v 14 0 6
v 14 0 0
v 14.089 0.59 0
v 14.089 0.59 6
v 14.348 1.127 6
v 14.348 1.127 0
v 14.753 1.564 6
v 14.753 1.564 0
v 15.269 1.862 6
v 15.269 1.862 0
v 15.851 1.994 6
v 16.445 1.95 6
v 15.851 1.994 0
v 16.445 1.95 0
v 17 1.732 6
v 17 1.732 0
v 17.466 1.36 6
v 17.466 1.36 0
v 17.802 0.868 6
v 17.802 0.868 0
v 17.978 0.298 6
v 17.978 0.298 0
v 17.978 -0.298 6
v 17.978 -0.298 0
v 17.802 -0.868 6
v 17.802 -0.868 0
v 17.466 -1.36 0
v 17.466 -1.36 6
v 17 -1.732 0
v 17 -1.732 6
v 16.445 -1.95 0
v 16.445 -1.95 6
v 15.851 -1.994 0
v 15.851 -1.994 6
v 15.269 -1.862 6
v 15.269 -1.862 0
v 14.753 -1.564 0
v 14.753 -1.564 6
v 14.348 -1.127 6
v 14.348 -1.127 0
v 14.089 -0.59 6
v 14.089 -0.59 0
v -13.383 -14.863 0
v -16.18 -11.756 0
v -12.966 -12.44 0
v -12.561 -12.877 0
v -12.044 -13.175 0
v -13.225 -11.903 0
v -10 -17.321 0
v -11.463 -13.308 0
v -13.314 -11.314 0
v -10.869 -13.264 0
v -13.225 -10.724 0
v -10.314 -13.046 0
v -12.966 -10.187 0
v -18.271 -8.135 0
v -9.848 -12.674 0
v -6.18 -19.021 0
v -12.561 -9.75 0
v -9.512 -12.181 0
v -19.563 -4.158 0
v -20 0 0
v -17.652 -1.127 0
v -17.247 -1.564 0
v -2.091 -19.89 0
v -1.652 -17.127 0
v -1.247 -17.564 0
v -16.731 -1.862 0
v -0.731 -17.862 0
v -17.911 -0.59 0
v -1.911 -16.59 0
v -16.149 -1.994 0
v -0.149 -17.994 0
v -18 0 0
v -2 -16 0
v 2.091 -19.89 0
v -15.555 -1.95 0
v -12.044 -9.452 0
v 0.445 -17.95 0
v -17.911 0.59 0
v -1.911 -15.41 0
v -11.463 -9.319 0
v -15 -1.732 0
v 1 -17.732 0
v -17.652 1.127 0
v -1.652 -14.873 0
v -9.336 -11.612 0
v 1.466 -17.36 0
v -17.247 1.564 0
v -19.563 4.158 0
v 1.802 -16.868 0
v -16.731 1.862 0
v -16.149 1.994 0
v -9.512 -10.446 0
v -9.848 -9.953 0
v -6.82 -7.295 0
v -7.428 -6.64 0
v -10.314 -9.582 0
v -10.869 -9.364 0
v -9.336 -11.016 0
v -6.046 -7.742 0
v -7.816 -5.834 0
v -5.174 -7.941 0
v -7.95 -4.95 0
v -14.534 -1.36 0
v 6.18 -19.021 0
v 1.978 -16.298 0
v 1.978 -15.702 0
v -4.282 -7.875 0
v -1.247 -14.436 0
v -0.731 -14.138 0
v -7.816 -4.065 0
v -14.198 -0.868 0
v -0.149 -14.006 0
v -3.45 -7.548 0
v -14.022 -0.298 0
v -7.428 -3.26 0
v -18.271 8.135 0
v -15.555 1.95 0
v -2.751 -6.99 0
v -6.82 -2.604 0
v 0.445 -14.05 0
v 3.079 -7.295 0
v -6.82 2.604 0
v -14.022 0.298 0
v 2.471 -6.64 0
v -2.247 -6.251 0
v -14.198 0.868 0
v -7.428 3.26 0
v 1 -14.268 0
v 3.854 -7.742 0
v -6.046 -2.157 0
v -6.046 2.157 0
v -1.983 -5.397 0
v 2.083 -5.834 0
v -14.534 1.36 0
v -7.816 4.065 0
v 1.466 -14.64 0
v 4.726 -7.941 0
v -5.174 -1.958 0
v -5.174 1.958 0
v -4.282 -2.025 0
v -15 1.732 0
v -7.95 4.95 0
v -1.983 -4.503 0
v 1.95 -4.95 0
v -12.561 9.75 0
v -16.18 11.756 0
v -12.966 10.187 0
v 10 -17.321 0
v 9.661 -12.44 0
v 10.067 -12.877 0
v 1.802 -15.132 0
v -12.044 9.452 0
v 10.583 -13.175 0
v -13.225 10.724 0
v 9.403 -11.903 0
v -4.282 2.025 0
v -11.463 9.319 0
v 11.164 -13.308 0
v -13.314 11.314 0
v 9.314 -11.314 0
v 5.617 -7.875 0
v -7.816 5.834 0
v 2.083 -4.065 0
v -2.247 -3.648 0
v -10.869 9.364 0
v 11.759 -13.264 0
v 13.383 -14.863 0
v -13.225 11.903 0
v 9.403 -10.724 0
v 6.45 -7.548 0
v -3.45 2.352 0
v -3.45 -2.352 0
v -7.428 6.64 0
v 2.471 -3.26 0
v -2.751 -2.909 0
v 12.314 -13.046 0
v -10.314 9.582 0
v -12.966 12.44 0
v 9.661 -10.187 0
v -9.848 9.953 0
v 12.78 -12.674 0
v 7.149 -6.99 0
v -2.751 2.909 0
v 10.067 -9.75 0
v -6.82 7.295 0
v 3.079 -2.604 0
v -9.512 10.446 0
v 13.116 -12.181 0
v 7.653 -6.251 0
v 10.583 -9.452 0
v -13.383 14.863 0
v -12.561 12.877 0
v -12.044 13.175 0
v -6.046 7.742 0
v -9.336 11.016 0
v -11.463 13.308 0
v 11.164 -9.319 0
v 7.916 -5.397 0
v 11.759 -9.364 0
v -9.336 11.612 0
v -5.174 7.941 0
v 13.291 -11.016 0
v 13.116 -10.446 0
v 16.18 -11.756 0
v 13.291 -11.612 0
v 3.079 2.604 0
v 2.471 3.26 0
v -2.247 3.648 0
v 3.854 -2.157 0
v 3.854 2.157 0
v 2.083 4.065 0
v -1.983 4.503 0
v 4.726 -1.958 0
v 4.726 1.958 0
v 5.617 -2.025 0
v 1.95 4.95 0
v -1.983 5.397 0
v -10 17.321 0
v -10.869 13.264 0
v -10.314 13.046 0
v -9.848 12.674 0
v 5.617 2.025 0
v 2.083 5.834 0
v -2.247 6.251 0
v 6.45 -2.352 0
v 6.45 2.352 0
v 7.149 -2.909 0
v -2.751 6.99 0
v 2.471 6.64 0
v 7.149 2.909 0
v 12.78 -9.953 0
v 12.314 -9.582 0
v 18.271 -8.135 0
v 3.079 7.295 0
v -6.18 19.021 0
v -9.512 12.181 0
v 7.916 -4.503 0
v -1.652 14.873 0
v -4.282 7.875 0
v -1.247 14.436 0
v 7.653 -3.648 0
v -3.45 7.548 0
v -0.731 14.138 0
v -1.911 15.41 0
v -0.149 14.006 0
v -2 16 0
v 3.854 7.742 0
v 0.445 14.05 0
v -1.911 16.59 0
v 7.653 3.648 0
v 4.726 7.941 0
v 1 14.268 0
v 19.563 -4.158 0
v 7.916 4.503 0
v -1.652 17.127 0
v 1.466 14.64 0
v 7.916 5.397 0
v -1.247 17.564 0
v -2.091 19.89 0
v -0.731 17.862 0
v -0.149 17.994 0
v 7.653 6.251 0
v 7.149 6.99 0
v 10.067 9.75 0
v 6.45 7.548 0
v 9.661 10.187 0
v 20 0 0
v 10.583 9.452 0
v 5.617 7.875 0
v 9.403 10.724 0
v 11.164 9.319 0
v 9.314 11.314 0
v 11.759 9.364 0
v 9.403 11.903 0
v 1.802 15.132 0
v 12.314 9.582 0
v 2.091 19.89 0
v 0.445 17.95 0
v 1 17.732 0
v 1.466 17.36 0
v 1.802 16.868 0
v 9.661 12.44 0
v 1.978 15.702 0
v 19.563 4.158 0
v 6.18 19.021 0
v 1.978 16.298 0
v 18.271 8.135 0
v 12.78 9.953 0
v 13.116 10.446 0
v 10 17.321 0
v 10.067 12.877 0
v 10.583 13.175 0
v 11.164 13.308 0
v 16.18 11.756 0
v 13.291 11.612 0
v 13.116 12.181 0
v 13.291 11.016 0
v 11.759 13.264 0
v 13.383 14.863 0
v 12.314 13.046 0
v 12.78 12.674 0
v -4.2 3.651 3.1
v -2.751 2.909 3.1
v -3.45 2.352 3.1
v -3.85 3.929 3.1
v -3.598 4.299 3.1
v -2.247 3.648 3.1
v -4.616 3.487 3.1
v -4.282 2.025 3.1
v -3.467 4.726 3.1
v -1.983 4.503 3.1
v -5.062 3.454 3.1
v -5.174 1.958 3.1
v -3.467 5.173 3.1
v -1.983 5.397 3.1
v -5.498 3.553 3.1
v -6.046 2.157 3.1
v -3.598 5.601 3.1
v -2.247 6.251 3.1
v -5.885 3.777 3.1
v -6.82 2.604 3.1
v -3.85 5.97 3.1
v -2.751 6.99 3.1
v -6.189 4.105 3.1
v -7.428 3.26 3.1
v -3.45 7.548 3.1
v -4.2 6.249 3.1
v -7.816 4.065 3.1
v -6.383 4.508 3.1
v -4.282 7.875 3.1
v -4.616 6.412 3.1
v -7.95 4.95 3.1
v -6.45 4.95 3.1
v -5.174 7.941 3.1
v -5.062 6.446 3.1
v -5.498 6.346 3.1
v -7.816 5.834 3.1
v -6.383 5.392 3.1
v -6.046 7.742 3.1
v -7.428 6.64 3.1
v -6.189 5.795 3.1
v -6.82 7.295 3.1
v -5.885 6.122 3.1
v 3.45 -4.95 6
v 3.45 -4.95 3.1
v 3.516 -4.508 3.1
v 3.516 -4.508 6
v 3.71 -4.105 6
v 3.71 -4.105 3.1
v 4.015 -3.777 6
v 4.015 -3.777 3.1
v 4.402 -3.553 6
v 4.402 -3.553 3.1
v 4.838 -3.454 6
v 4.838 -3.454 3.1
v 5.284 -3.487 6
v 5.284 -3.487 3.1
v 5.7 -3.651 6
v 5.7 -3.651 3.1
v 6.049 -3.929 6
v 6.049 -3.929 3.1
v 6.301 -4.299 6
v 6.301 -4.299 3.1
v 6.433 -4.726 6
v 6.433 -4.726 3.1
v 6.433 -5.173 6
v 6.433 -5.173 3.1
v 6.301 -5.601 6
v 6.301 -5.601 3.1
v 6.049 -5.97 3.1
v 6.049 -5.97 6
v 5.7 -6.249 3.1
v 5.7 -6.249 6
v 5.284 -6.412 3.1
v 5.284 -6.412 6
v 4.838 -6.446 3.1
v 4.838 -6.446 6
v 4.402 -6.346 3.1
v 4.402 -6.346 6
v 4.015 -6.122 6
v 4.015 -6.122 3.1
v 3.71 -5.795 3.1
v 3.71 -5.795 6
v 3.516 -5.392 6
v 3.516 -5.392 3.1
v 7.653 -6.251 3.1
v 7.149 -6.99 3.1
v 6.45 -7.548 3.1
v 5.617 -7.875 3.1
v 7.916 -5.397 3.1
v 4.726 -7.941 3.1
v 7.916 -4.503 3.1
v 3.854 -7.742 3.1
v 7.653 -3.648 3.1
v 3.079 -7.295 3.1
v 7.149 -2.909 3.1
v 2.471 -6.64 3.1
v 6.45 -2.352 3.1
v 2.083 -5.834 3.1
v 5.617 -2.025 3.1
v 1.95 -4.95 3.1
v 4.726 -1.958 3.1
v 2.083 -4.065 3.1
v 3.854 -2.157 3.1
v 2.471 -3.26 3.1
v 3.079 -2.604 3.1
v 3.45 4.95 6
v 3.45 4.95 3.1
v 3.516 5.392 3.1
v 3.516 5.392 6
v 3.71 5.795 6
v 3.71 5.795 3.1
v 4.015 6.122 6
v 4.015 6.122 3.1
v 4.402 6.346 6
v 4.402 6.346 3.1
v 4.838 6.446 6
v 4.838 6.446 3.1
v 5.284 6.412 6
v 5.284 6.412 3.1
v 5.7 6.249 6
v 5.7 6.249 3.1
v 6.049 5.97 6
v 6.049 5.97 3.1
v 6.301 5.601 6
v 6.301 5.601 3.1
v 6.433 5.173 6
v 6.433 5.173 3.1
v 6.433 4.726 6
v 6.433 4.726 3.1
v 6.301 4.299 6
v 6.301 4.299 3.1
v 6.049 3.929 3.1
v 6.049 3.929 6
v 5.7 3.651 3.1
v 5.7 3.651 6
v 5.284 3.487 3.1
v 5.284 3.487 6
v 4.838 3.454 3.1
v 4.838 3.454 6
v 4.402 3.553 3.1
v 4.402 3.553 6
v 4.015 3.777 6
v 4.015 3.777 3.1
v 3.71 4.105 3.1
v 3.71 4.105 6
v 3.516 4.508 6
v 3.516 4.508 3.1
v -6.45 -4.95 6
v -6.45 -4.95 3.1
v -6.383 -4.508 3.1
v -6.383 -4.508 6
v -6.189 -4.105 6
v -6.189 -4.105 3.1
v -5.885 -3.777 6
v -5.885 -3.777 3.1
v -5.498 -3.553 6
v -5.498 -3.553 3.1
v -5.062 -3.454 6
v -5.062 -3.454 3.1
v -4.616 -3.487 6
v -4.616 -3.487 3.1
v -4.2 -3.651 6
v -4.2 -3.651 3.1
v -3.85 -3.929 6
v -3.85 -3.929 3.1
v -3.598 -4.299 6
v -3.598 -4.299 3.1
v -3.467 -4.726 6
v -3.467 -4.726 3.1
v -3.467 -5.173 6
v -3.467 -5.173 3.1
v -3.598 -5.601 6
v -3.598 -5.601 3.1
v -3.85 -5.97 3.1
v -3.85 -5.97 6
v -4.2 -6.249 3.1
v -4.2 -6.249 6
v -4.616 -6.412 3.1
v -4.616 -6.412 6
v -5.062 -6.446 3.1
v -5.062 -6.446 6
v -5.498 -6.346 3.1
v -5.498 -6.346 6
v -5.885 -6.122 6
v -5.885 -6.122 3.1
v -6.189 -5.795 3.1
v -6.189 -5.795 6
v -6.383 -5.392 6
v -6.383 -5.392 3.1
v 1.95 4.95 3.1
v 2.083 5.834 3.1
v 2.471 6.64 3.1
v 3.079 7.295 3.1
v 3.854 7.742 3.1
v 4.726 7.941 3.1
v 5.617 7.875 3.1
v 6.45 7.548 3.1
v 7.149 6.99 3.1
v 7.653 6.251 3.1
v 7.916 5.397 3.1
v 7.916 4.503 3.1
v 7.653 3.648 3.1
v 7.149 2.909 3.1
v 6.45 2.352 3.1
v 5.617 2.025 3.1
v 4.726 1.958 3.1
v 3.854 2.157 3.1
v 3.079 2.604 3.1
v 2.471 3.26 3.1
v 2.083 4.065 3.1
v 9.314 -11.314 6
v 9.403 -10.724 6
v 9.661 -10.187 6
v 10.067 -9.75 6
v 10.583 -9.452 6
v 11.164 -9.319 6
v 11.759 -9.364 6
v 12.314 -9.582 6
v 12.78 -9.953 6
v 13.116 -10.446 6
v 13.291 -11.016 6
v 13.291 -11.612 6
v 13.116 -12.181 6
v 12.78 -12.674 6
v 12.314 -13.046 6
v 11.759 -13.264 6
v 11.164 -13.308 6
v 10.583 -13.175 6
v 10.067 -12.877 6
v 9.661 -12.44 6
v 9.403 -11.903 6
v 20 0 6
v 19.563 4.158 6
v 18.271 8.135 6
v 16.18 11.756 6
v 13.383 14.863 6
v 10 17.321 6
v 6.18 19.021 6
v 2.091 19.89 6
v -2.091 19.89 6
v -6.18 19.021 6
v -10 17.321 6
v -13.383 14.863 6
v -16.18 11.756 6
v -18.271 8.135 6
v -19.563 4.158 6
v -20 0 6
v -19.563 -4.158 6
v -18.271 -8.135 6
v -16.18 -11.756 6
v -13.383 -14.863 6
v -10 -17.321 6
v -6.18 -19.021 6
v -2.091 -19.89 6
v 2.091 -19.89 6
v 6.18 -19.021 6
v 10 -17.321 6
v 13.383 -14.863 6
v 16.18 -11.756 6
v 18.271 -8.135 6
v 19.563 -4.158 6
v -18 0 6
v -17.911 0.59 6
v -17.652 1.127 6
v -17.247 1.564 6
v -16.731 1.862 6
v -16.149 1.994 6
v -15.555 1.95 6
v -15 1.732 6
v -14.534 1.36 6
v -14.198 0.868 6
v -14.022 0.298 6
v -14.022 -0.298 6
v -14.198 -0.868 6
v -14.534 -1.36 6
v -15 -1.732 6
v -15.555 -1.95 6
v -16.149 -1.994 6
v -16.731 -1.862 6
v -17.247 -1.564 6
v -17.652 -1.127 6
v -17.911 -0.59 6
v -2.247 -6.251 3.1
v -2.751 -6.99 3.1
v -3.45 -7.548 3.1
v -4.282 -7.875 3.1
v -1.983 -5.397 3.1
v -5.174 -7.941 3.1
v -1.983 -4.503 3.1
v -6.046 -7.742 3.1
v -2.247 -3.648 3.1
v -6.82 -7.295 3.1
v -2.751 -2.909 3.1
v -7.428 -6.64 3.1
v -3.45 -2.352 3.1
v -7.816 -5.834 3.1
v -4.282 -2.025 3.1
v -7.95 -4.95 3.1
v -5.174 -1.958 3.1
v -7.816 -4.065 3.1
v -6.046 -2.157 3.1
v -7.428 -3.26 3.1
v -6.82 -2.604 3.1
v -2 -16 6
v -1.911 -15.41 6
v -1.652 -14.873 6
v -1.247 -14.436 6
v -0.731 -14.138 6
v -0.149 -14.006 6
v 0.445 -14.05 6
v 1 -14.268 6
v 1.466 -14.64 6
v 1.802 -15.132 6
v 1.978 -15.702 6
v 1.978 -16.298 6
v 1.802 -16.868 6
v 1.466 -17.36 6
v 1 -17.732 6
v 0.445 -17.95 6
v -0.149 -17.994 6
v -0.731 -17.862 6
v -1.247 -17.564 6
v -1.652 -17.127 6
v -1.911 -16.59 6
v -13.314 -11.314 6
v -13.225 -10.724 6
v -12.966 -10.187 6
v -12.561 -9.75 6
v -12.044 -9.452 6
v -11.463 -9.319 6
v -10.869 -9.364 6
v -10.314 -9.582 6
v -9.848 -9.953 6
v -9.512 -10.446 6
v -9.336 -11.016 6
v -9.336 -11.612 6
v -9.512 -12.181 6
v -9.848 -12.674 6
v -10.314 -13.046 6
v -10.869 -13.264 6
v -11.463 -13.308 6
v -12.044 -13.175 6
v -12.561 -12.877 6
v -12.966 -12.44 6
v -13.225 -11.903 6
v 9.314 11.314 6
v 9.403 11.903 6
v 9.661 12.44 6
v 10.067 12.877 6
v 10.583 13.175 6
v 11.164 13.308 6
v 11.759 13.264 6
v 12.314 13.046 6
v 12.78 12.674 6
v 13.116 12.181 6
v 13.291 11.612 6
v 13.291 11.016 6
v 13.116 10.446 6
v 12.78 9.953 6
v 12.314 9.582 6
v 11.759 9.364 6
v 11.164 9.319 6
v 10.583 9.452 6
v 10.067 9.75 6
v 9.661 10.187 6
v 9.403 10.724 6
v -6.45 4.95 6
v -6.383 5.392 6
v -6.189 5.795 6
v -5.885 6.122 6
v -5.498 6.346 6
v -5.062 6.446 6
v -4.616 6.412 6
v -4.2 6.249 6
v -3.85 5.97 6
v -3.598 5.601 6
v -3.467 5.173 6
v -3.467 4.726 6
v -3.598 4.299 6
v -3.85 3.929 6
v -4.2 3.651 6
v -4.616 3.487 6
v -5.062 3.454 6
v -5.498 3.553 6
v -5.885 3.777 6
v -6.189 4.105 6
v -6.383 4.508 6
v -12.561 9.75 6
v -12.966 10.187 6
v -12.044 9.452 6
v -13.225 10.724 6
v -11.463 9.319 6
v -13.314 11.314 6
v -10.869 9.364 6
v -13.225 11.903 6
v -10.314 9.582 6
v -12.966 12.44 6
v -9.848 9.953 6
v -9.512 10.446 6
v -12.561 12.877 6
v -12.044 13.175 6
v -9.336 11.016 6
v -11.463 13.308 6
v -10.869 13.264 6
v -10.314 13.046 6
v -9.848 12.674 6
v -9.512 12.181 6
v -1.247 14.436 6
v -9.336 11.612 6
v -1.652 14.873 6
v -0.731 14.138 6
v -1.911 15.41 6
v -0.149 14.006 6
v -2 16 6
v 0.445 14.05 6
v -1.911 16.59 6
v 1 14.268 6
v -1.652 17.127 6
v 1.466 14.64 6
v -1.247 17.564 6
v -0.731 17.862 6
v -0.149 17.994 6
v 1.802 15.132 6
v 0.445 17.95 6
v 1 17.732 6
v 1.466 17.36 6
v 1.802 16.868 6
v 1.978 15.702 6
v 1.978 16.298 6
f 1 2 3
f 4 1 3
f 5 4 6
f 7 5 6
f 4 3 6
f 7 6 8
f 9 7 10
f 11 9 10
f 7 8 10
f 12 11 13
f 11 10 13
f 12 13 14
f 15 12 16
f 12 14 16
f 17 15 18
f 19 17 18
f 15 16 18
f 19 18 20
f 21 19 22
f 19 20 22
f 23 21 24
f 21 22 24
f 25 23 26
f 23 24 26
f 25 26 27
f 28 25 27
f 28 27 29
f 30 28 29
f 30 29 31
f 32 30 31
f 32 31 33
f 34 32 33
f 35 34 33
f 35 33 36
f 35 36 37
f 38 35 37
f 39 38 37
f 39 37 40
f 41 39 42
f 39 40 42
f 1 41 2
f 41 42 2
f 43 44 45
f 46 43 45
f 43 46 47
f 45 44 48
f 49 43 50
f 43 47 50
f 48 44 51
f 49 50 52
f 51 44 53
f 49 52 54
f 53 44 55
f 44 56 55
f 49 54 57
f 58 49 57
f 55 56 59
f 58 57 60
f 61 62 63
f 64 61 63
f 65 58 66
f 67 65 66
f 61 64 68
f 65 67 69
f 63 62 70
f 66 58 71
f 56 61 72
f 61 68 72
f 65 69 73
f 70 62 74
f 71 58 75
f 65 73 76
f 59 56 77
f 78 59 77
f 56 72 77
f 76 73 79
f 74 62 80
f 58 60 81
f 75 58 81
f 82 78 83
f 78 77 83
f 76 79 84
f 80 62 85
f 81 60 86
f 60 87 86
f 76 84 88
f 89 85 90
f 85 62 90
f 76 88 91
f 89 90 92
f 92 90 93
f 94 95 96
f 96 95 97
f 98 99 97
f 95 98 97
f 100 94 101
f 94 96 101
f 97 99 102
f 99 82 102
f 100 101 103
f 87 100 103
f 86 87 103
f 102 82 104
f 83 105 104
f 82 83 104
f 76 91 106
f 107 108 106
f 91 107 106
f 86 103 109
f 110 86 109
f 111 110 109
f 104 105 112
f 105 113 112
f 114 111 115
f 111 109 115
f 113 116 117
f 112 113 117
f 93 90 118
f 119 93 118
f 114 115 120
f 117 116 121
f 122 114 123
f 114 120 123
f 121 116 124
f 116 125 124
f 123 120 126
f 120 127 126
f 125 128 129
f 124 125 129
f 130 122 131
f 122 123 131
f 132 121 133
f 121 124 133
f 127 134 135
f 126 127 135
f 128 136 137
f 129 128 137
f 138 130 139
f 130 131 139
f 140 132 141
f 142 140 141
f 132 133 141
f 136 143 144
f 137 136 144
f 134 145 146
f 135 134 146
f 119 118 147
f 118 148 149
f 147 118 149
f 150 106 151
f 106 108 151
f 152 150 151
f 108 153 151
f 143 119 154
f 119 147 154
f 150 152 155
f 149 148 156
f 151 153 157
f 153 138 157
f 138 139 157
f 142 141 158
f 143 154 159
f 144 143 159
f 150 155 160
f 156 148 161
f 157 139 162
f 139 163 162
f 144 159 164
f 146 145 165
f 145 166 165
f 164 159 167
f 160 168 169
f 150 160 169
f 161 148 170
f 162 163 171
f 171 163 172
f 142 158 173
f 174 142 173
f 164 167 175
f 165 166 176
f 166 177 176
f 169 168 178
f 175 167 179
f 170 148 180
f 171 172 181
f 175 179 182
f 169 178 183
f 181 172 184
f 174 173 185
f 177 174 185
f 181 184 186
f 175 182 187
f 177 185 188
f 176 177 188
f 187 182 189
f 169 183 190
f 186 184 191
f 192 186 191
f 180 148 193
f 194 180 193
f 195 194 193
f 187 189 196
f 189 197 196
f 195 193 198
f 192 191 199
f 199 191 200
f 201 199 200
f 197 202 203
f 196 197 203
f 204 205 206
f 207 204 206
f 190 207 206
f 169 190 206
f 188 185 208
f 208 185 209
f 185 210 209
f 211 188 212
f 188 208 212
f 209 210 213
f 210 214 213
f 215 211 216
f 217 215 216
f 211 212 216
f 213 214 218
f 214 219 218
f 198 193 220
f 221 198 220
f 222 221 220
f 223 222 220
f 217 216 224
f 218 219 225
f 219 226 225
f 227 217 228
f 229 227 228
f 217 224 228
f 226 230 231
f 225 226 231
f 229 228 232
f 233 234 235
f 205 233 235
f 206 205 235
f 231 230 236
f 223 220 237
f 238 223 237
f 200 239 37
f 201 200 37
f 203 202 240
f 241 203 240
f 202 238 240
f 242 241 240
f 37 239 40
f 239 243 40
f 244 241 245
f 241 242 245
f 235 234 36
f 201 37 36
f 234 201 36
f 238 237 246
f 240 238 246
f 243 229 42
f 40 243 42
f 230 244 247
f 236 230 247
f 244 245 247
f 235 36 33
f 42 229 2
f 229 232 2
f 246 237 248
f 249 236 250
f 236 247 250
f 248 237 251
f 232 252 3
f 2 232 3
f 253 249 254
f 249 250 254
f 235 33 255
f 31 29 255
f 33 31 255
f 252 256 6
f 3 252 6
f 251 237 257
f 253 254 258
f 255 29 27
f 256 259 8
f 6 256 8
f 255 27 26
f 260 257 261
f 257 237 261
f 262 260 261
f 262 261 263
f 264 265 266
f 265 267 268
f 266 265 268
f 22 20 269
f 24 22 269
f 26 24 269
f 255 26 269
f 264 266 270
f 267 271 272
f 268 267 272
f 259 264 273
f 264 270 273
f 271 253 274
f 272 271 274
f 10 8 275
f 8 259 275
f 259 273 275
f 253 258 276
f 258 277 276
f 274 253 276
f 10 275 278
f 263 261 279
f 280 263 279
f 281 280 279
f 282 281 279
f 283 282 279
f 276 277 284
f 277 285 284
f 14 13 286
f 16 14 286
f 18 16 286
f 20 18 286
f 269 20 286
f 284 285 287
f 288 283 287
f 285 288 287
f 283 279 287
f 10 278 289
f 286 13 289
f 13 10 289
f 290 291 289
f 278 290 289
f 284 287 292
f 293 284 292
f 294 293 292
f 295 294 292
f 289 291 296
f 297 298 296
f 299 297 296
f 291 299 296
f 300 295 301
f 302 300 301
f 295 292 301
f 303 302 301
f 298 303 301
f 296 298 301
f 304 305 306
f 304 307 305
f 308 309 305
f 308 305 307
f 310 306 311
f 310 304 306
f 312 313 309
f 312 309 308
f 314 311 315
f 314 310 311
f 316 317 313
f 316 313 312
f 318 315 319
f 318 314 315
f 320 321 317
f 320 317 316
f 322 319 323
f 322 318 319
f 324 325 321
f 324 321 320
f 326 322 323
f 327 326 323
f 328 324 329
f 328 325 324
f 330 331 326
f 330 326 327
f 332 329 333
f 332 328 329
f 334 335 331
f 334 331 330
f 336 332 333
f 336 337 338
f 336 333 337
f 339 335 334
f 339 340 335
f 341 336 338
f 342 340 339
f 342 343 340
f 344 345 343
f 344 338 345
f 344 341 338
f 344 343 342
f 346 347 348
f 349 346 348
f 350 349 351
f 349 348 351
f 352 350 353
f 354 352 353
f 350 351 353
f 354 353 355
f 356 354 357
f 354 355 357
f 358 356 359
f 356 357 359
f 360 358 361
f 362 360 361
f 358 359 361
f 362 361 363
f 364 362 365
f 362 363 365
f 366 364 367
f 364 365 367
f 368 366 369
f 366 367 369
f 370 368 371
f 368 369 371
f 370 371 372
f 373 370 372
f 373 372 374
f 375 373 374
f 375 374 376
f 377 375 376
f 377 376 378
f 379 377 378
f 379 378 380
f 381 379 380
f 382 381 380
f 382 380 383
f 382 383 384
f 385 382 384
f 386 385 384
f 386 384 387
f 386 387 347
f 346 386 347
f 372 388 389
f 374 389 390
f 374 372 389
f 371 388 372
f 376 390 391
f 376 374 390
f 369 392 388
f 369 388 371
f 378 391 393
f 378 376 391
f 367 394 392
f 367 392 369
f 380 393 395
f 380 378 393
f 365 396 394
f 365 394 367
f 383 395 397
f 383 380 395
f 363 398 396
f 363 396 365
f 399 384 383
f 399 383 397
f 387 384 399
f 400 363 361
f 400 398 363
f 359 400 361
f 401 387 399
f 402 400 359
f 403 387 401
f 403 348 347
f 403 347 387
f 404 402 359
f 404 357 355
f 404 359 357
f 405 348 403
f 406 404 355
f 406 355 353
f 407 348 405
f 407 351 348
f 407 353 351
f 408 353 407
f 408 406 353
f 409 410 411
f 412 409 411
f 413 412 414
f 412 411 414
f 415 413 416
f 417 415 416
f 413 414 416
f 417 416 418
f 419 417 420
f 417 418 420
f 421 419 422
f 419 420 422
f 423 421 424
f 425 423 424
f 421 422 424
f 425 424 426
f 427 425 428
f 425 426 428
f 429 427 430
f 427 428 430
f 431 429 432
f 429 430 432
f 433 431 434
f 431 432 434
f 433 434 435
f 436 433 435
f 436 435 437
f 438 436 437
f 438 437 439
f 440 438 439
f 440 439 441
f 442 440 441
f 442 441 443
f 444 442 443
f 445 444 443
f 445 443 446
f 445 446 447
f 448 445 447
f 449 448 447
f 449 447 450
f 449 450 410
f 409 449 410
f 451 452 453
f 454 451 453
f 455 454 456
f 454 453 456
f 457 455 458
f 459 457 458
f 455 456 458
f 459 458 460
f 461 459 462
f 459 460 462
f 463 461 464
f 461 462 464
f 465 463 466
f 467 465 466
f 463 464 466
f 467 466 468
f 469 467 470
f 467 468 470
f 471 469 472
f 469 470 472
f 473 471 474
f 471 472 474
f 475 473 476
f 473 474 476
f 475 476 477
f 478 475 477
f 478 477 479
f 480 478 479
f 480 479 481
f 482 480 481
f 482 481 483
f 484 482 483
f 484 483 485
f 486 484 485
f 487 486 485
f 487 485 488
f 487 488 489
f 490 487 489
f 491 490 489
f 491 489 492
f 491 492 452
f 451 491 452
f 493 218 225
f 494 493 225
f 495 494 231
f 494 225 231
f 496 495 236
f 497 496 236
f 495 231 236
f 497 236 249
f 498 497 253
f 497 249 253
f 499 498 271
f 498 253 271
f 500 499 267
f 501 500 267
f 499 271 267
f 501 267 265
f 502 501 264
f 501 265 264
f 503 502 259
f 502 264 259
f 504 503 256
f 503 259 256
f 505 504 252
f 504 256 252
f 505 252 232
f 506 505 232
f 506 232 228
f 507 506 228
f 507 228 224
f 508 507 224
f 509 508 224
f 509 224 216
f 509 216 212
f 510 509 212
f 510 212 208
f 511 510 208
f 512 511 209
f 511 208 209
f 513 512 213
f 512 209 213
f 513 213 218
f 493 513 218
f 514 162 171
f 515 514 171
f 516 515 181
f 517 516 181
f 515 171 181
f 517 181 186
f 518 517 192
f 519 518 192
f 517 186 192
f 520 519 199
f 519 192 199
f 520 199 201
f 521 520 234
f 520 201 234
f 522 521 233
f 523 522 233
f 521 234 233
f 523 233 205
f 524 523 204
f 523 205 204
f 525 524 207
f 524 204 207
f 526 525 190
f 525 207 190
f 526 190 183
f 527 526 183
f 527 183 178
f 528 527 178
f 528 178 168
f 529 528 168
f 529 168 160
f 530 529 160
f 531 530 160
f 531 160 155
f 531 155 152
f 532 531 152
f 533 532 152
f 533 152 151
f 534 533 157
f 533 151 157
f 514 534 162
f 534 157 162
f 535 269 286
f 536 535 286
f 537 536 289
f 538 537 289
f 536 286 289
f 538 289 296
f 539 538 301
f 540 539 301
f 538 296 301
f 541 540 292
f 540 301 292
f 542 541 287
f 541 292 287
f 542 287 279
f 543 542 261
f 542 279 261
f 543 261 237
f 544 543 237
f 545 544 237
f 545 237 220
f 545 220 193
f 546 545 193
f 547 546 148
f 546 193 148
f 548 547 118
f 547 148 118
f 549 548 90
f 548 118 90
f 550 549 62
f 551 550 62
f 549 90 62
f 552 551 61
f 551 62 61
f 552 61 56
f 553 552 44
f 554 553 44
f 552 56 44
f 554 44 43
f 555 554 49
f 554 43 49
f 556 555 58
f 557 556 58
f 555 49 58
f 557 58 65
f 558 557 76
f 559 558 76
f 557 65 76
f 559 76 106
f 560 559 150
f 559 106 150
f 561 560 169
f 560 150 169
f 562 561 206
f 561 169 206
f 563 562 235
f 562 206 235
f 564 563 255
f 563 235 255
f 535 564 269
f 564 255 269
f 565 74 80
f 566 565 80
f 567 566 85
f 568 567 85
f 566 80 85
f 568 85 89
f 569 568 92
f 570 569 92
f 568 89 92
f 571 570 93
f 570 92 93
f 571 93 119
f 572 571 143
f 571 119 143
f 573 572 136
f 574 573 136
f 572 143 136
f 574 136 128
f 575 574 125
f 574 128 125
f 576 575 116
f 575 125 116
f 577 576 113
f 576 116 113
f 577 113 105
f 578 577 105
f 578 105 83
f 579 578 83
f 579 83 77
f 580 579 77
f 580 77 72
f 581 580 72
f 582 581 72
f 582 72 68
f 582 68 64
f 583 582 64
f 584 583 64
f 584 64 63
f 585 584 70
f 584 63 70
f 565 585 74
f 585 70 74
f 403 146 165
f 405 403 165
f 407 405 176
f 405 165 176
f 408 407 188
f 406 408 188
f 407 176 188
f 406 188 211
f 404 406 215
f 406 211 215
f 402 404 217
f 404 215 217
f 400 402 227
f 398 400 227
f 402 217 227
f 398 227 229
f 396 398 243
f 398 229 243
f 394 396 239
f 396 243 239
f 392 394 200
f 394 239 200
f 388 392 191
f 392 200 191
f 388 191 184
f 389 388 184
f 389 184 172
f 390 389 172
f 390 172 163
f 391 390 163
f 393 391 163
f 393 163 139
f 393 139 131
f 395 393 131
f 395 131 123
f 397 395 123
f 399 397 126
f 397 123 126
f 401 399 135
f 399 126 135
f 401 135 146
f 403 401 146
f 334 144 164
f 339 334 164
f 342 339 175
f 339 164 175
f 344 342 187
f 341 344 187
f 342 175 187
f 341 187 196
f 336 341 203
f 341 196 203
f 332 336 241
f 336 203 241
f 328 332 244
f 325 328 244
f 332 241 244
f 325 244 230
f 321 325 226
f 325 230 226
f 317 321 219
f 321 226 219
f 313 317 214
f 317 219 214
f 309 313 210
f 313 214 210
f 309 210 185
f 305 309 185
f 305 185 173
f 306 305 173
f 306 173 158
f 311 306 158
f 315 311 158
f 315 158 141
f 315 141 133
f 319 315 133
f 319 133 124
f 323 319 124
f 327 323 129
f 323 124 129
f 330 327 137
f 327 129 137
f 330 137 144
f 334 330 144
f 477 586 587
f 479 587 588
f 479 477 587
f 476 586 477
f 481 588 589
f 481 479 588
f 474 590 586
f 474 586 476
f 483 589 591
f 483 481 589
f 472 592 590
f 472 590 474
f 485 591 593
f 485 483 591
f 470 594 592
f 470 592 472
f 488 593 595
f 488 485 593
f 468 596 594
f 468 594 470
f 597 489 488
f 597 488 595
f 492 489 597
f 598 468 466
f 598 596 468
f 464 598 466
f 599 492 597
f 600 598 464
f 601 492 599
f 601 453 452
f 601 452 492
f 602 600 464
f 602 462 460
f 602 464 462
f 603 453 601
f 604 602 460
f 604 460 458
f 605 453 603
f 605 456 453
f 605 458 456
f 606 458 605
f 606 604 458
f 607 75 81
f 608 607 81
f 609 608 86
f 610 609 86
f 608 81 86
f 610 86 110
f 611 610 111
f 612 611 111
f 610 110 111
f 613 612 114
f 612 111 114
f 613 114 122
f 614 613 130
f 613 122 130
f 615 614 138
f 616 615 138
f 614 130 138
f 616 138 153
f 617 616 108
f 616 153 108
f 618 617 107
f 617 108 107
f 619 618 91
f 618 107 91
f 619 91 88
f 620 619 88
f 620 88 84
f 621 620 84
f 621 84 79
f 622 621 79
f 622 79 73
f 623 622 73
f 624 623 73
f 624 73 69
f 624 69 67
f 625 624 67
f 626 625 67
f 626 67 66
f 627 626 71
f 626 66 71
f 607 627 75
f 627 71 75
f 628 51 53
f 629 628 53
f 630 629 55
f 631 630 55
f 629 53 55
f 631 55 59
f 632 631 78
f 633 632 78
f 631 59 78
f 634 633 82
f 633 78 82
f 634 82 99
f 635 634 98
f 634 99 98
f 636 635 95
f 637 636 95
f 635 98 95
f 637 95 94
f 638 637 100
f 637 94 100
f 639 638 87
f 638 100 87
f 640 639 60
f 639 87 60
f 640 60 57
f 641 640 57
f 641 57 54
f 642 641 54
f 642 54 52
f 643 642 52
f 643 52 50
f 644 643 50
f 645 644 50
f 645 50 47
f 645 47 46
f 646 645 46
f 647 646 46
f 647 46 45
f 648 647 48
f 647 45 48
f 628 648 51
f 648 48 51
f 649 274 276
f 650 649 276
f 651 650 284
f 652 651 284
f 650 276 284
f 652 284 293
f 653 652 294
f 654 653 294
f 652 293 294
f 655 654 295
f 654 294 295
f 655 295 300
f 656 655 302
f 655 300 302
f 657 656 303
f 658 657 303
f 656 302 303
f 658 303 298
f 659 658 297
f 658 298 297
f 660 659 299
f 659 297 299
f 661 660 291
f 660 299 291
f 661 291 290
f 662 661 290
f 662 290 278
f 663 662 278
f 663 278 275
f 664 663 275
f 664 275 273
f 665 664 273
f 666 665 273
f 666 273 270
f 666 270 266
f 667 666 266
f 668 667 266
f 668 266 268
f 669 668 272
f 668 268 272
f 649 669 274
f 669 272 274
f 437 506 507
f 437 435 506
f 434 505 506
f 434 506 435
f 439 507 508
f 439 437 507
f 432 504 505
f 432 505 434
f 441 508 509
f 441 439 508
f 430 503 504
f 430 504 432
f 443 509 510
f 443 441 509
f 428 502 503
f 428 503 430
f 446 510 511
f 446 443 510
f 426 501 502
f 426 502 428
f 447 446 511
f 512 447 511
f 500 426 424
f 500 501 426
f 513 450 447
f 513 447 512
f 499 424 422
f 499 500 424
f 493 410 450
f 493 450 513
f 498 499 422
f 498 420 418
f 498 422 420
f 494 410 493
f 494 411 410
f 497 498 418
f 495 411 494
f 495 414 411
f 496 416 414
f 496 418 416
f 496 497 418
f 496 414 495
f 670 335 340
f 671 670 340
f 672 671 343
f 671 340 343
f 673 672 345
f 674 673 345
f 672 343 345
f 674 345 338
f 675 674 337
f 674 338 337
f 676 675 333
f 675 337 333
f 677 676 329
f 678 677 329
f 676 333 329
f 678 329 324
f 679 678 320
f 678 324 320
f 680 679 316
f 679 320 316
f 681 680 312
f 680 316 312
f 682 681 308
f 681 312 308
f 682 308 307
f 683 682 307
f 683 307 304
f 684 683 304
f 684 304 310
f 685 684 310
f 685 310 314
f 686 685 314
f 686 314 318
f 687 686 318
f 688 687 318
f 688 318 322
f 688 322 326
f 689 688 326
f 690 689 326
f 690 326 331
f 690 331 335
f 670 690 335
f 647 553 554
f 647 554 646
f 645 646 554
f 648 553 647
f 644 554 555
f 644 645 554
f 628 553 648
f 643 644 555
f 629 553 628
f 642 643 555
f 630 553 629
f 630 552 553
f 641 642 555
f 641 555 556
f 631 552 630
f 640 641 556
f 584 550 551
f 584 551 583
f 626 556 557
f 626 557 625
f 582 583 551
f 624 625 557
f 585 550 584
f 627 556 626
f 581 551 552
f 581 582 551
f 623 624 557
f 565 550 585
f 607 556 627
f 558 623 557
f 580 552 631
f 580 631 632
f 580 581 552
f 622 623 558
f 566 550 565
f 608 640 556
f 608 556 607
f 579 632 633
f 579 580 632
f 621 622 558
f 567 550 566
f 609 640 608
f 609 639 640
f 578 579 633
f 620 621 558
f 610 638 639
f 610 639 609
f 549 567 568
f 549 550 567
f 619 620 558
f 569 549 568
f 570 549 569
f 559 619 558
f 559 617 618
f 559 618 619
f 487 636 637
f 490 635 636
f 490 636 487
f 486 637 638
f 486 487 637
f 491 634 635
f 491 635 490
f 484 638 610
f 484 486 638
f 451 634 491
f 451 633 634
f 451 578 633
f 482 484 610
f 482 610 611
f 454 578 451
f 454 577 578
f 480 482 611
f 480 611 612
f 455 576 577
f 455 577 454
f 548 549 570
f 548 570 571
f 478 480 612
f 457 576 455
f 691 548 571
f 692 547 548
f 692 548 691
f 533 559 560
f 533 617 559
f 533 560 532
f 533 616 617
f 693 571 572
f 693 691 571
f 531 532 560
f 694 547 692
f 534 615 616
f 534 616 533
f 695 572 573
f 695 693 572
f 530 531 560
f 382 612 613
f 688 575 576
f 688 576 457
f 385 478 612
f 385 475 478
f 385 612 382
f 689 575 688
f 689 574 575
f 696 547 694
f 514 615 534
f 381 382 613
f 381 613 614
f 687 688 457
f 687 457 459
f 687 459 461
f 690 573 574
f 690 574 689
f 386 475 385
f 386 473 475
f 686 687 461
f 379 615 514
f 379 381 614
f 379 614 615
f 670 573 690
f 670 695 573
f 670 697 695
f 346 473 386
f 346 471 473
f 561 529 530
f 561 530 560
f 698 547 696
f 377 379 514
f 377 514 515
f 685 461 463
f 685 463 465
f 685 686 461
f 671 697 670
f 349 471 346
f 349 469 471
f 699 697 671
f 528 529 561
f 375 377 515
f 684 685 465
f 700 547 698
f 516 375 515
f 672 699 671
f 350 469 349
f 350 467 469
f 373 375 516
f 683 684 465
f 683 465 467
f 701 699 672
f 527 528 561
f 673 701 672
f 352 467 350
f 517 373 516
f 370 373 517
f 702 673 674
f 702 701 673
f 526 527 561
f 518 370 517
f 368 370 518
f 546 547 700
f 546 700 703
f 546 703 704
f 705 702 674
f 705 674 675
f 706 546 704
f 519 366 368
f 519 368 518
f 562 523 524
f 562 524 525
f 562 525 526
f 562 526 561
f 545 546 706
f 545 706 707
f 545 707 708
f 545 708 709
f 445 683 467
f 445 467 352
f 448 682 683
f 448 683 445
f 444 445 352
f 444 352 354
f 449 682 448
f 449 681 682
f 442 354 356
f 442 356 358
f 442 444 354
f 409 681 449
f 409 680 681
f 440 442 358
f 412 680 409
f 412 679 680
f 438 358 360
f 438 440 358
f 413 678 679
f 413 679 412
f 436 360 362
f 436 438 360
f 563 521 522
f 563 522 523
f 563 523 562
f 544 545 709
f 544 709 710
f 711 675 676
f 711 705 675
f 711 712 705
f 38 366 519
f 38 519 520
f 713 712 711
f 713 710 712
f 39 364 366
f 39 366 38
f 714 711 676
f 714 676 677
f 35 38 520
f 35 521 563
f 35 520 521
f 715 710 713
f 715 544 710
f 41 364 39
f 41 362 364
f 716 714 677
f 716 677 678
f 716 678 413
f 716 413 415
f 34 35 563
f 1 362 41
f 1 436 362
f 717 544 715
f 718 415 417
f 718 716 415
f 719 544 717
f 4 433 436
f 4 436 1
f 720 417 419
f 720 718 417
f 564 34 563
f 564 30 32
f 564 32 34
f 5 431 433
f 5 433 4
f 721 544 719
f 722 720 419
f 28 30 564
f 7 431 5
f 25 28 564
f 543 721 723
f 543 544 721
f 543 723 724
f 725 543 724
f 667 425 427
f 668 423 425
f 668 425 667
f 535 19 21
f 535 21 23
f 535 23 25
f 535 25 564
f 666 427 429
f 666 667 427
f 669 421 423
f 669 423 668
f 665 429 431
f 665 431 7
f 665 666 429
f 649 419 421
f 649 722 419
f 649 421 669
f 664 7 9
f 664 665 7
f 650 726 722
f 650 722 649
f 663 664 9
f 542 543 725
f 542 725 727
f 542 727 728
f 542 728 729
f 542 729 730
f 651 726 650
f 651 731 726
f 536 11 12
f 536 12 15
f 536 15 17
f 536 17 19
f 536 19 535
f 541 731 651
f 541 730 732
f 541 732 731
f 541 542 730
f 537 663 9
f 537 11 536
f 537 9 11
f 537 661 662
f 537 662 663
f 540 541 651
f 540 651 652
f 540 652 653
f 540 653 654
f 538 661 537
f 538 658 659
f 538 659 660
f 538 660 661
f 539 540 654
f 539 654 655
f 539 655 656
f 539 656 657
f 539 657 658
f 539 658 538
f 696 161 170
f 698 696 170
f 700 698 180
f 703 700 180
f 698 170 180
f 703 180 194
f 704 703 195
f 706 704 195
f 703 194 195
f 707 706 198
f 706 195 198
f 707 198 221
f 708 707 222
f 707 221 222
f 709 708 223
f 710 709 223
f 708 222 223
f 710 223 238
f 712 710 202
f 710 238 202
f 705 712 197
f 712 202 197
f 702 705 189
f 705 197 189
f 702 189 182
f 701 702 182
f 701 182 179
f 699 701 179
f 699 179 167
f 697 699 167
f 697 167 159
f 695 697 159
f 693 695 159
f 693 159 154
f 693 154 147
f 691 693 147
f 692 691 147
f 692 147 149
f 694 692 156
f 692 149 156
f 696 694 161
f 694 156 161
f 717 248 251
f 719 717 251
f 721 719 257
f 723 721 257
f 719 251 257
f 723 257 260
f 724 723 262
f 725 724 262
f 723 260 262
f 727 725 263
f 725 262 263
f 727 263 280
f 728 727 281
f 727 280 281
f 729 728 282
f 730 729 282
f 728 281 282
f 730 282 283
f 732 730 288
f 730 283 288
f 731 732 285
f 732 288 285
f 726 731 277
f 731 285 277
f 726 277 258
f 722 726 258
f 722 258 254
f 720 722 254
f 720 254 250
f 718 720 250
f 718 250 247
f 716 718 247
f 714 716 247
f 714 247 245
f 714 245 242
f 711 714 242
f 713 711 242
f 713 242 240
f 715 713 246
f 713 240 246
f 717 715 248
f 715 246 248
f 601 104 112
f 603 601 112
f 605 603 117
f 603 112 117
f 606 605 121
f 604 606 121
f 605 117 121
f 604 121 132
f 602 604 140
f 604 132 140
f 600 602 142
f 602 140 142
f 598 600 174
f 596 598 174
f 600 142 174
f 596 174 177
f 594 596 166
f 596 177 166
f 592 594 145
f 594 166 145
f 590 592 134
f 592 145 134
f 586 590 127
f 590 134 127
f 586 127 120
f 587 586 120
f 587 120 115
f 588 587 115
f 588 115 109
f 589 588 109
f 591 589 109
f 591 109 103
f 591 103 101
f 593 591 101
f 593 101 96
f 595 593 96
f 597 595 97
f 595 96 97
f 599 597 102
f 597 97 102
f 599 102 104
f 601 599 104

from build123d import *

# Parameters (mm, degrees)
SKETCH1_R           = 20
BOSS_EXTRUDE1_DEPTH = 6
SKETCH2_R           = 2
SKETCH2_R_2         = 1.5
CUT_EXTRUDE1_DEPTH  = 6
SKETCH4_R           = 3
CUT_EXTRUDE2_DEPTH  = 3.1


with BuildPart() as part:
    # Sketch1 → Boss-Extrude1 (new body)
    with BuildSketch(Plane.XY):
        Circle(SKETCH1_R)
    extrude(amount=BOSS_EXTRUDE1_DEPTH)

    # Sketch2 → Cut-Extrude1 (cut)
    with BuildSketch(Plane(origin=(0, 0, 0), x_dir=(-1, 0, 0), z_dir=(0, 0, -1))):
        with Locations((0, 16)):
            Circle(SKETCH2_R)
        with Locations((11.313708499, 11.313708499)):
            Circle(SKETCH2_R)
        with Locations((16, 0)):
            Circle(SKETCH2_R)
        with Locations((11.313708499, -11.313708499)):
            Circle(SKETCH2_R)
        with Locations((0, -16)):
            Circle(SKETCH2_R)
        with Locations((-11.313708499, -11.313708499)):
            Circle(SKETCH2_R)
        with Locations((-16, 0)):
            Circle(SKETCH2_R)
        with Locations((-11.313708499, 11.313708499)):
            Circle(SKETCH2_R)
        with Locations((-4.949747468, -4.949747468)):
            Circle(SKETCH2_R_2)
        with Locations((-4.949747468, 4.949747468)):
            Circle(SKETCH2_R_2)
        with Locations((4.949747468, 4.949747468)):
            Circle(SKETCH2_R_2)
        with Locations((4.949747468, -4.949747468)):
            Circle(SKETCH2_R_2)
    extrude(amount=-CUT_EXTRUDE1_DEPTH, mode=Mode.SUBTRACT)

    # Sketch4 → Cut-Extrude2 (cut)
    with BuildSketch(Plane(origin=(0, 0, 0), x_dir=(-1, 0, 0), z_dir=(0, 0, -1))):
        with Locations((-4.949747468, 4.949747468)):
            Circle(SKETCH4_R)
        with Locations((4.949747468, 4.949747468)):
            Circle(SKETCH4_R)
        with Locations((4.949747468, -4.949747468)):
            Circle(SKETCH4_R)
        with Locations((-4.949747468, -4.949747468)):
            Circle(SKETCH4_R)
    extrude(amount=-CUT_EXTRUDE2_DEPTH, mode=Mode.SUBTRACT)


solid = part.part
